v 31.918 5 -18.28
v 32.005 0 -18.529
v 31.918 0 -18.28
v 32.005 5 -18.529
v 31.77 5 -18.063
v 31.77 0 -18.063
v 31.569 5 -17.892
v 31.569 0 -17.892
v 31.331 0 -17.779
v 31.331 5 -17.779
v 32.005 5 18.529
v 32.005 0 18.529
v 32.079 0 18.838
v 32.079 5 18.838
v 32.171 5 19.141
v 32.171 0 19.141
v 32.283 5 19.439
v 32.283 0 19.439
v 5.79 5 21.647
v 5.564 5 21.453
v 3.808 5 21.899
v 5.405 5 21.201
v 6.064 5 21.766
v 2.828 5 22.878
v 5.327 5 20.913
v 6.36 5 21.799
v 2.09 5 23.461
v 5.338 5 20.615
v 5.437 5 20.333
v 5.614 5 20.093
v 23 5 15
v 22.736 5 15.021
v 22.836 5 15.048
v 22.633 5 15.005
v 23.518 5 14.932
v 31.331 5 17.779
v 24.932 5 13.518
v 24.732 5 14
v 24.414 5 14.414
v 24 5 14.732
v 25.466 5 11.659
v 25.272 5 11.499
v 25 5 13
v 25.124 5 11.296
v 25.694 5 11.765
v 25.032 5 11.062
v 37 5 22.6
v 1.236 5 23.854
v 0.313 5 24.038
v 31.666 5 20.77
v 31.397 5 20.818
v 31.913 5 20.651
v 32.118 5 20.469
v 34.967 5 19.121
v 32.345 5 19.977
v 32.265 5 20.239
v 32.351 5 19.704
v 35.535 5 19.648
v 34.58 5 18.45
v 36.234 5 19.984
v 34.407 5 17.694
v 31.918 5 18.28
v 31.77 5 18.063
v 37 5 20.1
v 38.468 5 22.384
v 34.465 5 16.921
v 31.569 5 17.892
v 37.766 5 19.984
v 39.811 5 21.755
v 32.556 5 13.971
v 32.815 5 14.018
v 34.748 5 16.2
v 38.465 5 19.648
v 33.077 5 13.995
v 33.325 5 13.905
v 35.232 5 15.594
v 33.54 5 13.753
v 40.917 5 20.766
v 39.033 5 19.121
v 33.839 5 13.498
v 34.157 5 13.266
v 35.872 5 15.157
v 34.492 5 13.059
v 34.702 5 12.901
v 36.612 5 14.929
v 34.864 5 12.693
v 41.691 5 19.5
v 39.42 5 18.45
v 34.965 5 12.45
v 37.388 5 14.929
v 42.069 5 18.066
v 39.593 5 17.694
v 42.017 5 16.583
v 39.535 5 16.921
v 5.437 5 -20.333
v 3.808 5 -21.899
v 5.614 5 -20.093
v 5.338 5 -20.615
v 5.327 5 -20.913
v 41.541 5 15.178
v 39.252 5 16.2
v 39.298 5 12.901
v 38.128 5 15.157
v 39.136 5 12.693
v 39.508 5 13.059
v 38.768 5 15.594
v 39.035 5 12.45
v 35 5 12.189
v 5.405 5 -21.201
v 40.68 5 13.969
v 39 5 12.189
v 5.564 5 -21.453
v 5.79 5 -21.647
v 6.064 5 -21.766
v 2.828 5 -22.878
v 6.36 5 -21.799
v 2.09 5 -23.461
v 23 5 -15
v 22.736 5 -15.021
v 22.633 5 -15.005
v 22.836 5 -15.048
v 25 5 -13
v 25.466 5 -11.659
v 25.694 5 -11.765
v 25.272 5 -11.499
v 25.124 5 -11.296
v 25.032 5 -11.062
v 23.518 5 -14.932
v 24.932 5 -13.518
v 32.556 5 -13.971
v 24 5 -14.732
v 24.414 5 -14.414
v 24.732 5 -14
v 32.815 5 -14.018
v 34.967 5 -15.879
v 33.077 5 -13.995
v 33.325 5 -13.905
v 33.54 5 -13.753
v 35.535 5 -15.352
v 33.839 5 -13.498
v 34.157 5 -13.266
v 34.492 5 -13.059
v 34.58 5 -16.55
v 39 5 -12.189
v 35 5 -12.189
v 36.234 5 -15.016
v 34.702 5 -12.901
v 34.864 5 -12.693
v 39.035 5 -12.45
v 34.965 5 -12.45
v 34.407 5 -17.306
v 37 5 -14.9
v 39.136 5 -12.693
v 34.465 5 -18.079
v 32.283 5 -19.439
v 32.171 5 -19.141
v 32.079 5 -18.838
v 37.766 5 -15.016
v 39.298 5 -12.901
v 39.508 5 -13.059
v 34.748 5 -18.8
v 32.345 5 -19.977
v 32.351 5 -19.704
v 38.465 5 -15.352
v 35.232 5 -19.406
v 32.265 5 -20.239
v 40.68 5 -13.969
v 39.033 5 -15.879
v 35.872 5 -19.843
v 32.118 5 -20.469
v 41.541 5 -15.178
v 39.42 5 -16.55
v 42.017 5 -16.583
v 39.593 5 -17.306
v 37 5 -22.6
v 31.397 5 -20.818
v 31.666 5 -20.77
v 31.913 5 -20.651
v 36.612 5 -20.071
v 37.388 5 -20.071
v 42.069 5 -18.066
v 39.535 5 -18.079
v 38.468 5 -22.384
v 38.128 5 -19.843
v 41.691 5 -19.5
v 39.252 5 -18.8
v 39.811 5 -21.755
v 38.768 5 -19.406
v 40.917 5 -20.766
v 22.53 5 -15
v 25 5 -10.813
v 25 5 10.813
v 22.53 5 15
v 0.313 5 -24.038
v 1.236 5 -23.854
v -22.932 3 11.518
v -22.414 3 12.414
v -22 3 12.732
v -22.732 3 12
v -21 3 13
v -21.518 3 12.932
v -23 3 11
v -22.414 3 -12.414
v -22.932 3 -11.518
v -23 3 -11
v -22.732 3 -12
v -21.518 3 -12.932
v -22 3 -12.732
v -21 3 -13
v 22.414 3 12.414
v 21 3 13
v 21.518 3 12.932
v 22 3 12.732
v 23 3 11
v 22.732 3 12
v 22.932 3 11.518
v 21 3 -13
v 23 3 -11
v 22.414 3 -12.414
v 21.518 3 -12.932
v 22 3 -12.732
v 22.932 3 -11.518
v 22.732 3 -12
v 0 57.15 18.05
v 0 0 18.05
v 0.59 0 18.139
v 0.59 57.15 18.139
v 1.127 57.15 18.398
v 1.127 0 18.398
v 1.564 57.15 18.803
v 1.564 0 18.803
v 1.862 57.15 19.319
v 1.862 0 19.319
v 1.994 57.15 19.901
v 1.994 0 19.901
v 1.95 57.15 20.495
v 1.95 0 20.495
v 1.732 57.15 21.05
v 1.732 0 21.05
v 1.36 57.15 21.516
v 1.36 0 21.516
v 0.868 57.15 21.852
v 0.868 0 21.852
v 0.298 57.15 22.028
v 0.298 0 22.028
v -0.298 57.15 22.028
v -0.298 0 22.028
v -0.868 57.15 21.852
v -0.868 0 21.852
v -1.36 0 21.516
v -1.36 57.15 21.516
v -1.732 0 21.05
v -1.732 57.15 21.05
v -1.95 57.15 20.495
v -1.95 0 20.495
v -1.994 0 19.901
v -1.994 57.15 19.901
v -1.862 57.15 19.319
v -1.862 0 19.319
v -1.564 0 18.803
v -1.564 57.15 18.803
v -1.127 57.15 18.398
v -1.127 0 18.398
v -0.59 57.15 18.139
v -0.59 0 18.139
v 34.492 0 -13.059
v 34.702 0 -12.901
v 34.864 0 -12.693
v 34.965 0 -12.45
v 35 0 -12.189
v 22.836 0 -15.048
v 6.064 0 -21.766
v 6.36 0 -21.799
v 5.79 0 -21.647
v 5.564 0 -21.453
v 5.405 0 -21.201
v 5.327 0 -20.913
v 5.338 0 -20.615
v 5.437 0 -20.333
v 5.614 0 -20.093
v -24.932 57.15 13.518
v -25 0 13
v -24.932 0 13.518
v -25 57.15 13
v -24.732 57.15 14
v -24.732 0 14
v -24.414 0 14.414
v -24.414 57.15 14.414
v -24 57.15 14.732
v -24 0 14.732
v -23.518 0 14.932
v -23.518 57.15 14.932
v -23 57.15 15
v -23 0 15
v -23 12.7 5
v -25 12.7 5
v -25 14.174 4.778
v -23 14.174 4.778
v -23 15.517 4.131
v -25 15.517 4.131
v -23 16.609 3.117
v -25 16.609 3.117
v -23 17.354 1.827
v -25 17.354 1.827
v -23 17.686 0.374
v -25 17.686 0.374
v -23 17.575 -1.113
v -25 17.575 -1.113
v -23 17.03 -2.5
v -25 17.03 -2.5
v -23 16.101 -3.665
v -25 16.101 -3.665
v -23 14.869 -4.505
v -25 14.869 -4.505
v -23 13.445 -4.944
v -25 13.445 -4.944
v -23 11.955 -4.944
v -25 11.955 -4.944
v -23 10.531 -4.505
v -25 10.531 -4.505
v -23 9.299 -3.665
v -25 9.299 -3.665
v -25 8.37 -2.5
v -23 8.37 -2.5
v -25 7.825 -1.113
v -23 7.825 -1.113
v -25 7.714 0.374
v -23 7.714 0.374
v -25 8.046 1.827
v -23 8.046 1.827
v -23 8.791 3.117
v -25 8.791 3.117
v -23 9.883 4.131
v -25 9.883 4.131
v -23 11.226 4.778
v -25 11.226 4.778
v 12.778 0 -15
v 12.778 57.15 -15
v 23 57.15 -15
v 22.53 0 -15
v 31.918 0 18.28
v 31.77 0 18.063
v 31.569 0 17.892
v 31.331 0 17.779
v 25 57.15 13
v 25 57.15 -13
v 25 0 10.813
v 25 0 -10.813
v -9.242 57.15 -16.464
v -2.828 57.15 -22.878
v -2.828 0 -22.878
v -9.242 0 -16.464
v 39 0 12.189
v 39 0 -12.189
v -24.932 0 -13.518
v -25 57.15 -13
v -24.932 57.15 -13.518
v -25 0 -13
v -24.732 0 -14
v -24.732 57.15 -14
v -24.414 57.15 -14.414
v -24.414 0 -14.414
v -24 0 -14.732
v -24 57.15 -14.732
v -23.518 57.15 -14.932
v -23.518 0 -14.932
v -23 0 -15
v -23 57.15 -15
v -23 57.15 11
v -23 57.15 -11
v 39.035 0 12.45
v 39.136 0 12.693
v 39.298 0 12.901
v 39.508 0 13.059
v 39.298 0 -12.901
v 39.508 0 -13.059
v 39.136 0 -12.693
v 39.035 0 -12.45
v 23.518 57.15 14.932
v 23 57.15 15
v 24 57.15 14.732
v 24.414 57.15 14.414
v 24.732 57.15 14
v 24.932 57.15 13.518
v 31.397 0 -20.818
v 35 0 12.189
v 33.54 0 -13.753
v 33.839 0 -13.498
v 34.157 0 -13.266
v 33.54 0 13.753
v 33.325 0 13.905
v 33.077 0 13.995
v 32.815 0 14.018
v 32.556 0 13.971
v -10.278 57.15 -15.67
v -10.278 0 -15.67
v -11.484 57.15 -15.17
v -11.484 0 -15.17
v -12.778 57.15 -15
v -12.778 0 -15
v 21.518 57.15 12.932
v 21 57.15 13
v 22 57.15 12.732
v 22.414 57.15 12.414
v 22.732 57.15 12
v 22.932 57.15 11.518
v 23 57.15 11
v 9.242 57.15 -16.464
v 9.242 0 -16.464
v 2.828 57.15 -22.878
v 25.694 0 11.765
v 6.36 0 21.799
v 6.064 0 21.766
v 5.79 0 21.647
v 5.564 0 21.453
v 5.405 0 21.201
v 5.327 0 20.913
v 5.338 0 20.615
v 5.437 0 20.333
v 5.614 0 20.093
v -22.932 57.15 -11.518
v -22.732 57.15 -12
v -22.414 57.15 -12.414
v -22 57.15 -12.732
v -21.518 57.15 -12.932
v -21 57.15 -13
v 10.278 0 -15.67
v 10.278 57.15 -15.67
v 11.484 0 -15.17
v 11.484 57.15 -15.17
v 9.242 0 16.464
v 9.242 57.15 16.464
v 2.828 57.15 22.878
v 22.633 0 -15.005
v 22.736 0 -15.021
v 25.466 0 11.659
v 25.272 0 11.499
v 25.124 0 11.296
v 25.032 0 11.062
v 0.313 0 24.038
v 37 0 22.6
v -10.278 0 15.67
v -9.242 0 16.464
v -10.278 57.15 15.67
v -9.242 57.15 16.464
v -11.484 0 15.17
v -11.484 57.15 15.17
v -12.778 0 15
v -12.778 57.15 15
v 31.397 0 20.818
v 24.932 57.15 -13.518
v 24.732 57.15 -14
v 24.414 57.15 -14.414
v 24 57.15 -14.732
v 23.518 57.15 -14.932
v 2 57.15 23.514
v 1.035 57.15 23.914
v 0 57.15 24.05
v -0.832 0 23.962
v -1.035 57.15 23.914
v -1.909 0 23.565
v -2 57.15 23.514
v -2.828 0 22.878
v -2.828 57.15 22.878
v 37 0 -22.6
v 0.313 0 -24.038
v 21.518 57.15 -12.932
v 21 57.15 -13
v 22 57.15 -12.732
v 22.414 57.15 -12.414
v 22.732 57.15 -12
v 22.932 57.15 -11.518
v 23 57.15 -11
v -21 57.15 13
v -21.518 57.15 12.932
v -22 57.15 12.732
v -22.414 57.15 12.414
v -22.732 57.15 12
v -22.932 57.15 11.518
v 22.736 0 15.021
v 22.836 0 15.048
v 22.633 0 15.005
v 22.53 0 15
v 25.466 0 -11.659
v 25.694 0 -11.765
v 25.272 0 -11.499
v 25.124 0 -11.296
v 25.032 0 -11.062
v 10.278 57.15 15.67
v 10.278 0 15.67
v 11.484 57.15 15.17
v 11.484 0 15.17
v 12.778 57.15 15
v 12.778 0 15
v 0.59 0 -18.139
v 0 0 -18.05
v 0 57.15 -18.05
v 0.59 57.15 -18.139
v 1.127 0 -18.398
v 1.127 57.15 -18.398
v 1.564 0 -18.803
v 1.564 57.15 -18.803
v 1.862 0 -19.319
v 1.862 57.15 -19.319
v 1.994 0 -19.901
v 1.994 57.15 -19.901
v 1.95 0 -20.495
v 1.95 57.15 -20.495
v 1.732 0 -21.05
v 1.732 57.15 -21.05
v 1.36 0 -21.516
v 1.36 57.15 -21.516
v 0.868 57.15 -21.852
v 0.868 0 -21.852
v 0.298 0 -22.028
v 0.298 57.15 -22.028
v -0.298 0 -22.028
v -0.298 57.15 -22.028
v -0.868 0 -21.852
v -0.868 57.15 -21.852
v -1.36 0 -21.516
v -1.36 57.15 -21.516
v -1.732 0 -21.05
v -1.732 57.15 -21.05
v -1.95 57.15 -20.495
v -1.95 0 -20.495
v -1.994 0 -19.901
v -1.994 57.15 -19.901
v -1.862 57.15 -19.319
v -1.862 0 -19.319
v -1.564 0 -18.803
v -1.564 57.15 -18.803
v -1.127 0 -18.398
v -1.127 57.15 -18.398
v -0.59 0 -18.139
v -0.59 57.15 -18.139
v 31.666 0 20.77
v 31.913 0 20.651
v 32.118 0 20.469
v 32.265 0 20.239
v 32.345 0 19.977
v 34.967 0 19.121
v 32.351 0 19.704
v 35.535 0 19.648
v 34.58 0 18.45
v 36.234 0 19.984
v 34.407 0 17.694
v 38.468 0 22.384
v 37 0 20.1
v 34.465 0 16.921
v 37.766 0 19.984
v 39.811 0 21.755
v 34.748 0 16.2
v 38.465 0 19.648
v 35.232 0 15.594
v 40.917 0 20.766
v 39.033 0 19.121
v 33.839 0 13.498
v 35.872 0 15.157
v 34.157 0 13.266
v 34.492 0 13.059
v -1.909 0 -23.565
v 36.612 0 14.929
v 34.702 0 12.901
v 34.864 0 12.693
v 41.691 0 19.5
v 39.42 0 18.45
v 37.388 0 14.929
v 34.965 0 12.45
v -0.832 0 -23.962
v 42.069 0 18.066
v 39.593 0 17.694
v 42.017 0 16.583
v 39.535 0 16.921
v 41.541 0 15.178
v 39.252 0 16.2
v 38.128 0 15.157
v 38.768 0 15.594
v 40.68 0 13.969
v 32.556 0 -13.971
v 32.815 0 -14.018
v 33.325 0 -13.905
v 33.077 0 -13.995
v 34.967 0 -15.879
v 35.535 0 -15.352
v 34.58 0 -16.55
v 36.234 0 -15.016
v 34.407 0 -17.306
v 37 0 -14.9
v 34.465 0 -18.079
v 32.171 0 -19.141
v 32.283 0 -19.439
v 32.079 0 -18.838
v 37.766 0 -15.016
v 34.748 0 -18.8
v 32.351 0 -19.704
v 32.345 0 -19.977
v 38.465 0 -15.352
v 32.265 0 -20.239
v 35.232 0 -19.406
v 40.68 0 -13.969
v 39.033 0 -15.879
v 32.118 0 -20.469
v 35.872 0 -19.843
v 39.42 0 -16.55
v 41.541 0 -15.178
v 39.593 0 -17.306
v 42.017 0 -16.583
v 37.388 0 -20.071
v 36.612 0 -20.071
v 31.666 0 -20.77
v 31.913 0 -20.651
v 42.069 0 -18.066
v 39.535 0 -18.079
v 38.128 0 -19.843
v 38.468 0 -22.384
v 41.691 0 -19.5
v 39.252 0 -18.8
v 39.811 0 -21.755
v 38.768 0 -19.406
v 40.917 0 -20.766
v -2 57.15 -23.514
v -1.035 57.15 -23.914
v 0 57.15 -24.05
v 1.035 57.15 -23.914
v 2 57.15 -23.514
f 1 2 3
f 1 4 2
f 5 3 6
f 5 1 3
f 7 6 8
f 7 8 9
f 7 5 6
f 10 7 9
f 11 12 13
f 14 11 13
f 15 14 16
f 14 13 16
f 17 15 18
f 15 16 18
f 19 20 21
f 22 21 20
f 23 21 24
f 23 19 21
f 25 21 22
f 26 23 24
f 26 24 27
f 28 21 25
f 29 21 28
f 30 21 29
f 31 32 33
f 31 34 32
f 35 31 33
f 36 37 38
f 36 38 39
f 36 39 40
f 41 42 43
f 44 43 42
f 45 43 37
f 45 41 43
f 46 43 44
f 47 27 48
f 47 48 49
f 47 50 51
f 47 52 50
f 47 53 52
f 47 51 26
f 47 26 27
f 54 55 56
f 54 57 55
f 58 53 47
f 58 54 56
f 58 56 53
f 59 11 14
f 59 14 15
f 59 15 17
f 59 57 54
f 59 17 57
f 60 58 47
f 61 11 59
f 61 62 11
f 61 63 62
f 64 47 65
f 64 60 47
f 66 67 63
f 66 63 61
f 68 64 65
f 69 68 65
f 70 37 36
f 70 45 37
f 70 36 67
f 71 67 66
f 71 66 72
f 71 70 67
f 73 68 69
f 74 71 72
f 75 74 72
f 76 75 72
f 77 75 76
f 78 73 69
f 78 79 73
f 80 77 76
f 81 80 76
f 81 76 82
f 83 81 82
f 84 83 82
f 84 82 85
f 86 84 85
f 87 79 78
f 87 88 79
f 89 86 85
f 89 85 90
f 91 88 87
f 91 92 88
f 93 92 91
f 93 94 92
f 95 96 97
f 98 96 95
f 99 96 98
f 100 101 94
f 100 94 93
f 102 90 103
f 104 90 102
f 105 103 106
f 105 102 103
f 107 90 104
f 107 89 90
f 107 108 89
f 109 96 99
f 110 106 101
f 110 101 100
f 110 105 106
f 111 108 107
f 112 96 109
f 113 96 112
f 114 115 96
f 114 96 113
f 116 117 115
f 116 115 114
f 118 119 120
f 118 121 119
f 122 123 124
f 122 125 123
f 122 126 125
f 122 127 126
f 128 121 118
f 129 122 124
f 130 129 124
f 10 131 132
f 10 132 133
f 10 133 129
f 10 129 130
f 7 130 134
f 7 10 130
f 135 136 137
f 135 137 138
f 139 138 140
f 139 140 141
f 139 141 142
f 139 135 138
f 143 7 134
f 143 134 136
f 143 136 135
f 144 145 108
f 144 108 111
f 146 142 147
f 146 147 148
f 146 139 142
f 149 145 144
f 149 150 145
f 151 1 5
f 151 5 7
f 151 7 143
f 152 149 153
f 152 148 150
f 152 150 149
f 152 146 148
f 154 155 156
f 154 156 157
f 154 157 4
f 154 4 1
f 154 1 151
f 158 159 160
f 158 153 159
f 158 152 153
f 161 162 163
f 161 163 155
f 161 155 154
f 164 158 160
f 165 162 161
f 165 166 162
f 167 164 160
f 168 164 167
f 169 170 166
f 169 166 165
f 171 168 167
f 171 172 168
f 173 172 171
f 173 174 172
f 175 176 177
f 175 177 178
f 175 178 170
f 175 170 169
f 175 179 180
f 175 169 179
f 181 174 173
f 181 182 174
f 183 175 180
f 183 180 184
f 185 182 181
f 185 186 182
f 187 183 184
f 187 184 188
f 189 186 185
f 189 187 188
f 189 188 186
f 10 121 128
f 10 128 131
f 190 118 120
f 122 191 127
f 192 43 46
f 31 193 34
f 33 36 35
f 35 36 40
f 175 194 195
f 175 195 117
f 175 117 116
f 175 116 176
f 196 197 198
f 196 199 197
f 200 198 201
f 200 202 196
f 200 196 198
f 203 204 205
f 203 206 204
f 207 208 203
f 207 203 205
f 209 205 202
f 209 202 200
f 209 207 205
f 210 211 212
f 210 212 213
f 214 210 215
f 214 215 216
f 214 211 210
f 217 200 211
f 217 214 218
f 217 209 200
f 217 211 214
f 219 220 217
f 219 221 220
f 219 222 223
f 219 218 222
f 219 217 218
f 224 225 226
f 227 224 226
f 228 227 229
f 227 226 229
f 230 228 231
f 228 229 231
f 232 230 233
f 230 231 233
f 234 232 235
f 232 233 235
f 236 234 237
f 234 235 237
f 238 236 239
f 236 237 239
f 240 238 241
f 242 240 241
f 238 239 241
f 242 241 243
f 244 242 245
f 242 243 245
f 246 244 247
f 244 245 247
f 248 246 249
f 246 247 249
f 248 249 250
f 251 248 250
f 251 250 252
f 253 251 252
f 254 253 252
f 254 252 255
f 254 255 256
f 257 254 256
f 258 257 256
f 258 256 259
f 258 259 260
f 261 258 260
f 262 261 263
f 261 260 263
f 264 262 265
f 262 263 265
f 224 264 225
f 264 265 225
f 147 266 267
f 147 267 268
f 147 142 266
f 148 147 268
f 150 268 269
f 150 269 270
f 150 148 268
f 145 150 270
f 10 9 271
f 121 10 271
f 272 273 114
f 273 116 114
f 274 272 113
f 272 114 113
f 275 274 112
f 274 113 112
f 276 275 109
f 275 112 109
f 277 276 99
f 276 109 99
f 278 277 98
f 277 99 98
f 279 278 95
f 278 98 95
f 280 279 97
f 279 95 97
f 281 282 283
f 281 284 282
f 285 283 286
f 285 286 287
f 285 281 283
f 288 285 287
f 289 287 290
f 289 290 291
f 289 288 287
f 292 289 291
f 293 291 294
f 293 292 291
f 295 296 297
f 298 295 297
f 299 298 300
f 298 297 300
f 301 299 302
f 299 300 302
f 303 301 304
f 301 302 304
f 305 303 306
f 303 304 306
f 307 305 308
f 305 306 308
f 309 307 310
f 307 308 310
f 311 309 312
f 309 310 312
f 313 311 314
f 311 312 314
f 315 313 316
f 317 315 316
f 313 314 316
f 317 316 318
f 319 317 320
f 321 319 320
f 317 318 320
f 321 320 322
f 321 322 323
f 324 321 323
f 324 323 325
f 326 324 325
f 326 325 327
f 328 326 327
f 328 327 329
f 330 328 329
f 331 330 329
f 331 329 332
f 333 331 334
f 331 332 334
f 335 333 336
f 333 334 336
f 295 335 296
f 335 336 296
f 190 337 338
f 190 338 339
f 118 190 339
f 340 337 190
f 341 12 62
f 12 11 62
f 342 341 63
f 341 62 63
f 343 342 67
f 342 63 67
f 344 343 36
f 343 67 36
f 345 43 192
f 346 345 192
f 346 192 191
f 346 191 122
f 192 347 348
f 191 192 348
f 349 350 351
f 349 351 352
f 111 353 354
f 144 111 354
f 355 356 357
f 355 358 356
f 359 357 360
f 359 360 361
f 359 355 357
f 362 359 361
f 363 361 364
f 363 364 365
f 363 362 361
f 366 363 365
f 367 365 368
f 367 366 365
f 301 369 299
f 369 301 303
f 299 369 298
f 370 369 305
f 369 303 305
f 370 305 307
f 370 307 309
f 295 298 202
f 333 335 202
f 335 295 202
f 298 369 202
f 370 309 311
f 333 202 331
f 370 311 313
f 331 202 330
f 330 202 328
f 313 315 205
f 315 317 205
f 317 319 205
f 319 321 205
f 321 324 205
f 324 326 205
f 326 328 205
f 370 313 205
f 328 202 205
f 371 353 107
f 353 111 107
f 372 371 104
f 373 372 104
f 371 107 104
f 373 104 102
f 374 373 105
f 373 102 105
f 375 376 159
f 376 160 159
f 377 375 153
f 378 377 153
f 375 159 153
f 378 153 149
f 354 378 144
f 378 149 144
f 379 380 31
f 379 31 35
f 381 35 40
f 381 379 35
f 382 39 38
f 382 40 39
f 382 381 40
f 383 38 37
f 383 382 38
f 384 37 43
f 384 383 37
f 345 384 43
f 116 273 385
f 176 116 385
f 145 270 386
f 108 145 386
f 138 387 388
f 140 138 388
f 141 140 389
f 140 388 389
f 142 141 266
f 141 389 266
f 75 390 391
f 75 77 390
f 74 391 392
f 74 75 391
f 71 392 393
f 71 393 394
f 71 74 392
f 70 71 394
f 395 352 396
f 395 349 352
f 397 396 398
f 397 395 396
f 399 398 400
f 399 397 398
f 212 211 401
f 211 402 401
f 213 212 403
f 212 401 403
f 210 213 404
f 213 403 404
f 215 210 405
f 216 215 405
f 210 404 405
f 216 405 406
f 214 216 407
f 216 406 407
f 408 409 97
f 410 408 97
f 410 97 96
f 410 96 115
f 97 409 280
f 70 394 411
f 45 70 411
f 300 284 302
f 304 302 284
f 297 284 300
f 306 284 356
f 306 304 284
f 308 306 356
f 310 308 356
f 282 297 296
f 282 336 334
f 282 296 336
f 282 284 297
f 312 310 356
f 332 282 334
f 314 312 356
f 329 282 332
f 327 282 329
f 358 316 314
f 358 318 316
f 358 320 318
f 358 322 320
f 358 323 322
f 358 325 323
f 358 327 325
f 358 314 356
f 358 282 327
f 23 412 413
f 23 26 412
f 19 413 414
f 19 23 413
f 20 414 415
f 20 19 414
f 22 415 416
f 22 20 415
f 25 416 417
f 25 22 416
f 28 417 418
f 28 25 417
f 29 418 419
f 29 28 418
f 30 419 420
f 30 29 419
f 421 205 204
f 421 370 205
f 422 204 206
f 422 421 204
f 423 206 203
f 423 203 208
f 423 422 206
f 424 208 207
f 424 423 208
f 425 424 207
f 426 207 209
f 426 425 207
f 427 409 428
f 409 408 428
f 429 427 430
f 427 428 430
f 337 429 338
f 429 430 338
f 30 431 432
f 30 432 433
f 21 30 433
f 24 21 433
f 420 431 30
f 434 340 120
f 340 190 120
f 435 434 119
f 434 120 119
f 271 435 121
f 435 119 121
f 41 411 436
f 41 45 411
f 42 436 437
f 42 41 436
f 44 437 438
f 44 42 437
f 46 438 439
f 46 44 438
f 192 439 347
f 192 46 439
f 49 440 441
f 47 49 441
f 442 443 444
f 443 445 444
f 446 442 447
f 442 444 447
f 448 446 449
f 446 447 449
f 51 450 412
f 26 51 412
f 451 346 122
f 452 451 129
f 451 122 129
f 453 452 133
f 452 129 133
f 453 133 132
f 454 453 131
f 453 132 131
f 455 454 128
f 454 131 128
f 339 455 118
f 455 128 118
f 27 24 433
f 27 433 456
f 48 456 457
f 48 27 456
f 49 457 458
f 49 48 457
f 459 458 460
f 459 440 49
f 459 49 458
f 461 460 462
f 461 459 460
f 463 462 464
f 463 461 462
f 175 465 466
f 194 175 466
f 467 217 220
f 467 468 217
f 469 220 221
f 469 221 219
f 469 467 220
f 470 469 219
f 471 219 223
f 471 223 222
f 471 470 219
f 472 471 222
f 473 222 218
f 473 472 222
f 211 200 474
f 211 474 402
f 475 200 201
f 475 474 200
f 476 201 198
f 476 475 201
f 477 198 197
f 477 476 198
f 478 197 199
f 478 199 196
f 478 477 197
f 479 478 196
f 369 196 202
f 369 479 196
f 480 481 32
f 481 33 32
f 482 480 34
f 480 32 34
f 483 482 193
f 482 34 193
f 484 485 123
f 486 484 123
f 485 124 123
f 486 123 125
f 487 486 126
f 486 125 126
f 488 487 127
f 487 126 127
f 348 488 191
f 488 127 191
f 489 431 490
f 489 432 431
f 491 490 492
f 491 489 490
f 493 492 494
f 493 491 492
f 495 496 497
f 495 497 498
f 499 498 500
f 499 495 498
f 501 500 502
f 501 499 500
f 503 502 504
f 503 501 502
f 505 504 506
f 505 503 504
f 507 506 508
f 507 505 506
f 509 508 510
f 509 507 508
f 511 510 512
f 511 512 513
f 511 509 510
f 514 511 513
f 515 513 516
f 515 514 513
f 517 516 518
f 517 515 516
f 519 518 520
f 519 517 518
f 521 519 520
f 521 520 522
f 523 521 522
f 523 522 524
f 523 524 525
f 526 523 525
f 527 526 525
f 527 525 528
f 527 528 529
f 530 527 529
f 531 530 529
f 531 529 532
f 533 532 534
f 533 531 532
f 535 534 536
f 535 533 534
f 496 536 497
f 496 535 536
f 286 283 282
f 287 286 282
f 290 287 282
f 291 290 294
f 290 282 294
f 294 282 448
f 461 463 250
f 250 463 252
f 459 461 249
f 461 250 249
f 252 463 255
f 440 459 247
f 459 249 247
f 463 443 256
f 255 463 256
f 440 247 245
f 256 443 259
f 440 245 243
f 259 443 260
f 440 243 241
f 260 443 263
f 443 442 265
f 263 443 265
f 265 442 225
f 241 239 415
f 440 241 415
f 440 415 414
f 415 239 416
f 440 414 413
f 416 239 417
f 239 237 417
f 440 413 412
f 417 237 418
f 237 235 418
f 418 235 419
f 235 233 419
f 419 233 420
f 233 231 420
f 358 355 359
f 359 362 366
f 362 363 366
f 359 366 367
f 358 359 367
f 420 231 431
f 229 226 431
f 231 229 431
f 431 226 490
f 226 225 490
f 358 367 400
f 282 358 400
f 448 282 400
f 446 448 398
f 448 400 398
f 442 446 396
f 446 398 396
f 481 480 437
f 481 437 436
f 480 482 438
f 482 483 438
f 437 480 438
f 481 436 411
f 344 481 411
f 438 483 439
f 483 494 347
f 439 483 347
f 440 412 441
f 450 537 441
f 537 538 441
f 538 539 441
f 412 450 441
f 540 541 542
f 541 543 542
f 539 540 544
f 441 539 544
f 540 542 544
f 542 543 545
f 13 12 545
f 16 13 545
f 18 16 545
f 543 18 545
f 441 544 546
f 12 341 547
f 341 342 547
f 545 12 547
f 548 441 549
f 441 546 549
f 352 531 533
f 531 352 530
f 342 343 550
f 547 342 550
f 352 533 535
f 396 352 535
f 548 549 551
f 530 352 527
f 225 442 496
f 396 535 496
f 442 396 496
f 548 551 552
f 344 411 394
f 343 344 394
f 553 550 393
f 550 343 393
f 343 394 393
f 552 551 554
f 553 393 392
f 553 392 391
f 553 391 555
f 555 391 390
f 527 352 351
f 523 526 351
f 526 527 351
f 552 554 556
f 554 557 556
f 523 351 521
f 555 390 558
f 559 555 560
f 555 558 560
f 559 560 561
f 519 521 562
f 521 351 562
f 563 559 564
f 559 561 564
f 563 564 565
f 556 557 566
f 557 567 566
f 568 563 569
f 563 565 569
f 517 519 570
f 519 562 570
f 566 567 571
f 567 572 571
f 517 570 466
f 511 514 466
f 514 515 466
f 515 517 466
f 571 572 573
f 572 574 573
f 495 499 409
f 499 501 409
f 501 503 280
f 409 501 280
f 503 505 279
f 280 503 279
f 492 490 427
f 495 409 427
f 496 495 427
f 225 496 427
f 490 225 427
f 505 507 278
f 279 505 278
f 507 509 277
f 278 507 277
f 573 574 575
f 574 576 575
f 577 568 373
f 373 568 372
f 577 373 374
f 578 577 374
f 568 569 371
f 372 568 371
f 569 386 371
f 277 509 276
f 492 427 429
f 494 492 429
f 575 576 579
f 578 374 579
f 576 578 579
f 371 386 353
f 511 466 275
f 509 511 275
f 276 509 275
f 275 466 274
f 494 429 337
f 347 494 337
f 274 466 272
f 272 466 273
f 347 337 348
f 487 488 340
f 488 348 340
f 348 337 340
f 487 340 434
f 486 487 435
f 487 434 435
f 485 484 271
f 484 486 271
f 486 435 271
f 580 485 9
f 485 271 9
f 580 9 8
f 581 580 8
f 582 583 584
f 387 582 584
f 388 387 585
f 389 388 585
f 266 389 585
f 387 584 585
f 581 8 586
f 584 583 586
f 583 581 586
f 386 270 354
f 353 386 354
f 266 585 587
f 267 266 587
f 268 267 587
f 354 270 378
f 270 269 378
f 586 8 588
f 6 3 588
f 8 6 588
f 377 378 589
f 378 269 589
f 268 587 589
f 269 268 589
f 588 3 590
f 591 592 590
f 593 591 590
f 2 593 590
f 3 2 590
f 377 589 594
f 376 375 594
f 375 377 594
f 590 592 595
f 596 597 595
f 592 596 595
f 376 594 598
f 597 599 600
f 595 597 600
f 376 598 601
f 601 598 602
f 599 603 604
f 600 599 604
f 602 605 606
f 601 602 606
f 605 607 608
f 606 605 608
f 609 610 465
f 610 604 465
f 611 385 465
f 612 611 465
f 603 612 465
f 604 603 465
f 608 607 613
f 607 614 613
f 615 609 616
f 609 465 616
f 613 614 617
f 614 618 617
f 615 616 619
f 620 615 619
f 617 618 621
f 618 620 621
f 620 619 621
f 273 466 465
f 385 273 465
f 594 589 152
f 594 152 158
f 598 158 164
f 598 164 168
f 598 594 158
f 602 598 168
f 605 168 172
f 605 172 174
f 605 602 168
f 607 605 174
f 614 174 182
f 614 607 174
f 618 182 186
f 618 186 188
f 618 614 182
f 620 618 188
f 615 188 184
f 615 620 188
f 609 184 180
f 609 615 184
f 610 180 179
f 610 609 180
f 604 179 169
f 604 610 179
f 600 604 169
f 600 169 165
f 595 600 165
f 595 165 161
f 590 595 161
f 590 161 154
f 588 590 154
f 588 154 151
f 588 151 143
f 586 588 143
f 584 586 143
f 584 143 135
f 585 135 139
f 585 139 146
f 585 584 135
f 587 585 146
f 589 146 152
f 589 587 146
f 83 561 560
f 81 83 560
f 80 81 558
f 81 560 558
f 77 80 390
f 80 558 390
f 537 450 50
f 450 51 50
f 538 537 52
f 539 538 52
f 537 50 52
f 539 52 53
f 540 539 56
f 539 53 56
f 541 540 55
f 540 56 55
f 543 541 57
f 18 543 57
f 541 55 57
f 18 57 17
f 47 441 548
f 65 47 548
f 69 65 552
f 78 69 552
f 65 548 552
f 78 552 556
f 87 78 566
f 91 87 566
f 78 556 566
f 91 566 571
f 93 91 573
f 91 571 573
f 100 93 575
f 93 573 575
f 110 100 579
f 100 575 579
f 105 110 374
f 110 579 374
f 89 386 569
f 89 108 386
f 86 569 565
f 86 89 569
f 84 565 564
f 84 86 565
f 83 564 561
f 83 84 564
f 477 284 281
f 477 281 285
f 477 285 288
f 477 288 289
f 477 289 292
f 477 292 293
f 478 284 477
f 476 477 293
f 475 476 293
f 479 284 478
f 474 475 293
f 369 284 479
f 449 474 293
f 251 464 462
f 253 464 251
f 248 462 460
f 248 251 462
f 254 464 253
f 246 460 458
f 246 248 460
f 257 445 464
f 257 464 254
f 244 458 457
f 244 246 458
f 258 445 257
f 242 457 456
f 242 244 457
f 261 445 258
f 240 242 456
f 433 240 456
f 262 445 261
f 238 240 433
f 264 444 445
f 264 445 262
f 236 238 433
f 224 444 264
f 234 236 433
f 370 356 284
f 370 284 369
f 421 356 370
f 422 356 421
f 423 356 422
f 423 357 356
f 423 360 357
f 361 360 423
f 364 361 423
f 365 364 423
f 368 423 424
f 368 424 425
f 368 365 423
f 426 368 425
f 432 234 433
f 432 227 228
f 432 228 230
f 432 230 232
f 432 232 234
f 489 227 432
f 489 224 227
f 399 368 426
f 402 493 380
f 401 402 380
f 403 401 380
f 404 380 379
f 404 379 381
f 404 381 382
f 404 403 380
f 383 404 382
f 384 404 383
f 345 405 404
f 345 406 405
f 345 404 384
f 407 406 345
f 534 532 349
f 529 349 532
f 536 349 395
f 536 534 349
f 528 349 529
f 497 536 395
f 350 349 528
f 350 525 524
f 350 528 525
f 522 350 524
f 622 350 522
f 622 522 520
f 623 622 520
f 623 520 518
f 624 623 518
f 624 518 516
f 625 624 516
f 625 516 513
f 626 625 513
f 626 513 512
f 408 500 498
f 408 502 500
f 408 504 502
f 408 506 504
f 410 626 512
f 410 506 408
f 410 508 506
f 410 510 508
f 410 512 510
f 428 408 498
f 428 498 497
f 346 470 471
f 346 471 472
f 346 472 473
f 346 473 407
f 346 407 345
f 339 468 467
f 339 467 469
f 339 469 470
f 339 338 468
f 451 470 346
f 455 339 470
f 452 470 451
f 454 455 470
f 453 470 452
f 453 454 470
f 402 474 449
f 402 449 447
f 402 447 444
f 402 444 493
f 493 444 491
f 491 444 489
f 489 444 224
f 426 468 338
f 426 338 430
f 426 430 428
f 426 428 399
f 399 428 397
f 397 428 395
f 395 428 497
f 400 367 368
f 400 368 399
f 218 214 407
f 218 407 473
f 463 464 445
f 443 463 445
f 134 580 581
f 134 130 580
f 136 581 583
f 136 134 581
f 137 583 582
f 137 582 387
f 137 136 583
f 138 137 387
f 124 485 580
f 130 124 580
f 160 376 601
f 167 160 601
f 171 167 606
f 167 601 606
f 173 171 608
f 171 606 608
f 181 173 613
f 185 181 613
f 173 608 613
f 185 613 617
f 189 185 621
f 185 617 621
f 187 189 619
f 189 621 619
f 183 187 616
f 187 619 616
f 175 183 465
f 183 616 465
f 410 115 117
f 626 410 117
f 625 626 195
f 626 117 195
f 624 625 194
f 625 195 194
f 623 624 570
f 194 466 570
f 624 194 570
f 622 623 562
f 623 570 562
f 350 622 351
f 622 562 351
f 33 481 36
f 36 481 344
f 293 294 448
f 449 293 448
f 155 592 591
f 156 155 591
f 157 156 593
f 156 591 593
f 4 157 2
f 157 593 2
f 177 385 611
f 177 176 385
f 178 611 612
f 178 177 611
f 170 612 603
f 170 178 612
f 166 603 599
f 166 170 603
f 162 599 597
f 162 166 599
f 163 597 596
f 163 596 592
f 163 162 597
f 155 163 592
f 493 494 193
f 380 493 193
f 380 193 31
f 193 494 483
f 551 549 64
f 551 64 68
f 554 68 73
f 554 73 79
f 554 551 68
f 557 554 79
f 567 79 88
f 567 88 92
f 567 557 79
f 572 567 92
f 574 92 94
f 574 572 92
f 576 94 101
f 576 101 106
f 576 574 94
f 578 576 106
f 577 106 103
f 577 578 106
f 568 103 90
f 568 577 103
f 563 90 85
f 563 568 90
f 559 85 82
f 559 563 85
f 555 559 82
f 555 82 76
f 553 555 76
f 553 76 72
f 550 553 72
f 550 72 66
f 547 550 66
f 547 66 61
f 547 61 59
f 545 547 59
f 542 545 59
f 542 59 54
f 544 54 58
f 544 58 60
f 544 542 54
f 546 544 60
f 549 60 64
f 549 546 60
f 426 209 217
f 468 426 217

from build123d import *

# Parameters (mm, degrees)
SKETCH1_W           = 50
SKETCH1_H           = 30
BOSS_EXTRUDE1_DEPTH = 3
SKETCH2_W           = 50
SKETCH2_H           = 30
SKETCH2_W_2         = 46
SKETCH2_H_2         = 26
BOSS_EXTRUDE2_DEPTH = 54.15
SKETCH3_R           = 2
BOSS_EXTRUDE3_DEPTH = 57.15
FILLET1_R           = 2
SKETCH4_R           = 5
CUT_EXTRUDE1_DEPTH  = 2
SKETCH5_R           = 2.6
BOSS_EXTRUDE4_DEPTH = 5
FILLET2_R           = 1
FILLET3_R           = 5


with BuildPart() as part:
    # Sketch1 → Boss-Extrude1 (new body)
    with BuildSketch(Plane(origin=(0, 0, 0), x_dir=(1, 0, 0), z_dir=(0, 1, 0))):
        Rectangle(SKETCH1_W, SKETCH1_H)
    extrude(amount=BOSS_EXTRUDE1_DEPTH)

    # Sketch2 → Boss-Extrude2 (add)
    with BuildSketch(Plane(origin=(0, 3, 0), x_dir=(1, 0, 0), z_dir=(0, 1, 0))):
        Rectangle(SKETCH2_W, SKETCH2_H)
        Rectangle(SKETCH2_W_2, SKETCH2_H_2, mode=Mode.SUBTRACT)
    extrude(amount=BOSS_EXTRUDE2_DEPTH)

    # Sketch3 → Boss-Extrude3 (add)
    with BuildSketch(Plane(origin=(0, 0, 0), x_dir=(1, 0, 0), z_dir=(0, 1, 0))):
        with BuildLine():
            ThreePointArc((2.828427125, 22.878427125), (0, 24.05), (-2.828427125, 22.878427125))
            Line((-2.828427125, 22.878427125), (-10.706854249, 15))
            Line((-10.706854249, 15), (10.706854249, 15))
            Line((10.706854249, 15), (2.828427125, 22.878427125))
        make_face()
        with Locations(Location((0, 20.05, 0), (0, 0, 270))):
            Circle(SKETCH3_R, mode=Mode.SUBTRACT)
    boss_extrude3 = extrude(amount=BOSS_EXTRUDE3_DEPTH)

    # Mirror1: Boss-Extrude3 across plane
    add(boss_extrude3.mirror(Plane.XY))

    # Fillet1
    fillet1_edges = [part.edges().sort_by_distance(p)[0] for p in [
        (23, 30.075, 13),
        (23, 30.075, -13),
        (-23, 30.075, -13),
        (-23, 30.075, 13),
        (25, 28.575, 15),
        (-25, 28.575, 15),
        (-25, 28.575, -15),
        (25, 28.575, -15),
    ]]
    fillet(fillet1_edges, radius=FILLET1_R)

    # Sketch4 → Cut-Extrude1 (cut)
    with BuildSketch(Plane.ZY.offset(25)):
        with Locations((0, 12.7)):
            Circle(SKETCH4_R)
    extrude(amount=-CUT_EXTRUDE1_DEPTH, mode=Mode.SUBTRACT)

    # Sketch5 → Boss-Extrude4 (add)
    with BuildSketch(Plane(origin=(0, 0, 0), x_dir=(1, 0, 0), z_dir=(0, 1, 0))):
        with BuildLine():
            Line((3.807606463, 21.899247787), (33.071665812, 20.752413028))
            ThreePointArc((33.071665812, 20.752413028), (32.286385501, 19.447264326), (31.921557121, 17.96842067))
            Line((31.921557121, 17.96842067), (22.686470591, 15))
            Line((22.686470591, 15), (23, 15))
            ThreePointArc((23, 15), (24.414213562, 14.414213562), (25, 13))
            Line((25, 13), (25, 11.542079833))
            Line((25, 11.542079833), (33.145593843, 14.160306425))
            ThreePointArc((33.145593843, 14.160306425), (33.99577787, 13.37875633), (35, 12.808518358))
            Line((35, 12.808518358), (35, -12.808518358))
            ThreePointArc((35, -12.808518358), (33.99577787, -13.37875633), (33.145593843, -14.160306425))
            Line((33.145593843, -14.160306425), (25, -11.542079833))
            Line((25, -11.542079833), (25, -13))
            ThreePointArc((25, -13), (24.414213562, -14.414213562), (23, -15))
            Line((23, -15), (22.686470591, -15))
            Line((22.686470591, -15), (31.921557121, -17.96842067))
            ThreePointArc((31.921557121, -17.96842067), (32.286385501, -19.447264326), (33.071665812, -20.752413028))
            Line((33.071665812, -20.752413028), (3.807606463, -21.899247787))
            Line((3.807606463, -21.899247787), (2.828427125, -22.878427125))
            ThreePointArc((2.828427125, -22.878427125), (1.674272914, -23.682741418), (0.31303276, -24.0377325))
            Line((0.31303276, -24.0377325), (37, -22.6))
            ThreePointArc((37, -22.6), (41.996826812, -18.520647741), (39, -12.808518358))
            Line((39, -12.808518358), (39, 12.808518358))
            ThreePointArc((39, 12.808518358), (41.996826812, 18.520647741), (37, 22.6))
            Line((37, 22.6), (0.31303276, 24.0377325))
            ThreePointArc((0.31303276, 24.0377325), (1.674272914, 23.682741418), (2.828427125, 22.878427125))
            Line((2.828427125, 22.878427125), (3.807606463, 21.899247787))
        make_face()
        with Locations(Location((37, 17.5, 0), (0, 0, 270))):
            Circle(SKETCH5_R, mode=Mode.SUBTRACT)
        with Locations(Location((37, -17.5, 0), (0, 0, 270))):
            Circle(SKETCH5_R, mode=Mode.SUBTRACT)
    extrude(amount=BOSS_EXTRUDE4_DEPTH)

    # Fillet2
    fillet2_edges = [part.edges().sort_by_distance(p)[0] for p in [
        (3.807606463, 2.5, -21.899247787),
        (33.071665812, 2.5, -20.752413028),
        (31.921557121, 2.5, -17.96842067),
        (22.686470591, 2.5, -15),
        (25, 2.5, -11.542079833),
        (33.145593843, 2.5, -14.160306425),
        (35, 2.5, -12.808518358),
        (35, 2.5, 12.808518358),
        (33.145593843, 2.5, 14.160306425),
        (25, 2.5, 11.542079833),
        (22.686470591, 2.5, 15),
        (31.921557121, 2.5, 17.96842067),
        (33.071665812, 2.5, 20.752413028),
        (3.807606463, 2.5, 21.899247787),
        (39, 2.5, 12.808518358),
        (39, 2.5, -12.808518358),
    ]]
    fillet(fillet2_edges, radius=FILLET2_R)

    # Fillet3
    fillet3_edges = [part.edges().sort_by_distance(p)[0] for p in [
        (10.706854249, 28.575, -15),
        (-10.706854249, 28.575, -15),
        (-10.706854249, 28.575, 15),
        (10.706854249, 28.575, 15),
    ]]
    fillet(fillet3_edges, radius=FILLET3_R)


solid = part.part
